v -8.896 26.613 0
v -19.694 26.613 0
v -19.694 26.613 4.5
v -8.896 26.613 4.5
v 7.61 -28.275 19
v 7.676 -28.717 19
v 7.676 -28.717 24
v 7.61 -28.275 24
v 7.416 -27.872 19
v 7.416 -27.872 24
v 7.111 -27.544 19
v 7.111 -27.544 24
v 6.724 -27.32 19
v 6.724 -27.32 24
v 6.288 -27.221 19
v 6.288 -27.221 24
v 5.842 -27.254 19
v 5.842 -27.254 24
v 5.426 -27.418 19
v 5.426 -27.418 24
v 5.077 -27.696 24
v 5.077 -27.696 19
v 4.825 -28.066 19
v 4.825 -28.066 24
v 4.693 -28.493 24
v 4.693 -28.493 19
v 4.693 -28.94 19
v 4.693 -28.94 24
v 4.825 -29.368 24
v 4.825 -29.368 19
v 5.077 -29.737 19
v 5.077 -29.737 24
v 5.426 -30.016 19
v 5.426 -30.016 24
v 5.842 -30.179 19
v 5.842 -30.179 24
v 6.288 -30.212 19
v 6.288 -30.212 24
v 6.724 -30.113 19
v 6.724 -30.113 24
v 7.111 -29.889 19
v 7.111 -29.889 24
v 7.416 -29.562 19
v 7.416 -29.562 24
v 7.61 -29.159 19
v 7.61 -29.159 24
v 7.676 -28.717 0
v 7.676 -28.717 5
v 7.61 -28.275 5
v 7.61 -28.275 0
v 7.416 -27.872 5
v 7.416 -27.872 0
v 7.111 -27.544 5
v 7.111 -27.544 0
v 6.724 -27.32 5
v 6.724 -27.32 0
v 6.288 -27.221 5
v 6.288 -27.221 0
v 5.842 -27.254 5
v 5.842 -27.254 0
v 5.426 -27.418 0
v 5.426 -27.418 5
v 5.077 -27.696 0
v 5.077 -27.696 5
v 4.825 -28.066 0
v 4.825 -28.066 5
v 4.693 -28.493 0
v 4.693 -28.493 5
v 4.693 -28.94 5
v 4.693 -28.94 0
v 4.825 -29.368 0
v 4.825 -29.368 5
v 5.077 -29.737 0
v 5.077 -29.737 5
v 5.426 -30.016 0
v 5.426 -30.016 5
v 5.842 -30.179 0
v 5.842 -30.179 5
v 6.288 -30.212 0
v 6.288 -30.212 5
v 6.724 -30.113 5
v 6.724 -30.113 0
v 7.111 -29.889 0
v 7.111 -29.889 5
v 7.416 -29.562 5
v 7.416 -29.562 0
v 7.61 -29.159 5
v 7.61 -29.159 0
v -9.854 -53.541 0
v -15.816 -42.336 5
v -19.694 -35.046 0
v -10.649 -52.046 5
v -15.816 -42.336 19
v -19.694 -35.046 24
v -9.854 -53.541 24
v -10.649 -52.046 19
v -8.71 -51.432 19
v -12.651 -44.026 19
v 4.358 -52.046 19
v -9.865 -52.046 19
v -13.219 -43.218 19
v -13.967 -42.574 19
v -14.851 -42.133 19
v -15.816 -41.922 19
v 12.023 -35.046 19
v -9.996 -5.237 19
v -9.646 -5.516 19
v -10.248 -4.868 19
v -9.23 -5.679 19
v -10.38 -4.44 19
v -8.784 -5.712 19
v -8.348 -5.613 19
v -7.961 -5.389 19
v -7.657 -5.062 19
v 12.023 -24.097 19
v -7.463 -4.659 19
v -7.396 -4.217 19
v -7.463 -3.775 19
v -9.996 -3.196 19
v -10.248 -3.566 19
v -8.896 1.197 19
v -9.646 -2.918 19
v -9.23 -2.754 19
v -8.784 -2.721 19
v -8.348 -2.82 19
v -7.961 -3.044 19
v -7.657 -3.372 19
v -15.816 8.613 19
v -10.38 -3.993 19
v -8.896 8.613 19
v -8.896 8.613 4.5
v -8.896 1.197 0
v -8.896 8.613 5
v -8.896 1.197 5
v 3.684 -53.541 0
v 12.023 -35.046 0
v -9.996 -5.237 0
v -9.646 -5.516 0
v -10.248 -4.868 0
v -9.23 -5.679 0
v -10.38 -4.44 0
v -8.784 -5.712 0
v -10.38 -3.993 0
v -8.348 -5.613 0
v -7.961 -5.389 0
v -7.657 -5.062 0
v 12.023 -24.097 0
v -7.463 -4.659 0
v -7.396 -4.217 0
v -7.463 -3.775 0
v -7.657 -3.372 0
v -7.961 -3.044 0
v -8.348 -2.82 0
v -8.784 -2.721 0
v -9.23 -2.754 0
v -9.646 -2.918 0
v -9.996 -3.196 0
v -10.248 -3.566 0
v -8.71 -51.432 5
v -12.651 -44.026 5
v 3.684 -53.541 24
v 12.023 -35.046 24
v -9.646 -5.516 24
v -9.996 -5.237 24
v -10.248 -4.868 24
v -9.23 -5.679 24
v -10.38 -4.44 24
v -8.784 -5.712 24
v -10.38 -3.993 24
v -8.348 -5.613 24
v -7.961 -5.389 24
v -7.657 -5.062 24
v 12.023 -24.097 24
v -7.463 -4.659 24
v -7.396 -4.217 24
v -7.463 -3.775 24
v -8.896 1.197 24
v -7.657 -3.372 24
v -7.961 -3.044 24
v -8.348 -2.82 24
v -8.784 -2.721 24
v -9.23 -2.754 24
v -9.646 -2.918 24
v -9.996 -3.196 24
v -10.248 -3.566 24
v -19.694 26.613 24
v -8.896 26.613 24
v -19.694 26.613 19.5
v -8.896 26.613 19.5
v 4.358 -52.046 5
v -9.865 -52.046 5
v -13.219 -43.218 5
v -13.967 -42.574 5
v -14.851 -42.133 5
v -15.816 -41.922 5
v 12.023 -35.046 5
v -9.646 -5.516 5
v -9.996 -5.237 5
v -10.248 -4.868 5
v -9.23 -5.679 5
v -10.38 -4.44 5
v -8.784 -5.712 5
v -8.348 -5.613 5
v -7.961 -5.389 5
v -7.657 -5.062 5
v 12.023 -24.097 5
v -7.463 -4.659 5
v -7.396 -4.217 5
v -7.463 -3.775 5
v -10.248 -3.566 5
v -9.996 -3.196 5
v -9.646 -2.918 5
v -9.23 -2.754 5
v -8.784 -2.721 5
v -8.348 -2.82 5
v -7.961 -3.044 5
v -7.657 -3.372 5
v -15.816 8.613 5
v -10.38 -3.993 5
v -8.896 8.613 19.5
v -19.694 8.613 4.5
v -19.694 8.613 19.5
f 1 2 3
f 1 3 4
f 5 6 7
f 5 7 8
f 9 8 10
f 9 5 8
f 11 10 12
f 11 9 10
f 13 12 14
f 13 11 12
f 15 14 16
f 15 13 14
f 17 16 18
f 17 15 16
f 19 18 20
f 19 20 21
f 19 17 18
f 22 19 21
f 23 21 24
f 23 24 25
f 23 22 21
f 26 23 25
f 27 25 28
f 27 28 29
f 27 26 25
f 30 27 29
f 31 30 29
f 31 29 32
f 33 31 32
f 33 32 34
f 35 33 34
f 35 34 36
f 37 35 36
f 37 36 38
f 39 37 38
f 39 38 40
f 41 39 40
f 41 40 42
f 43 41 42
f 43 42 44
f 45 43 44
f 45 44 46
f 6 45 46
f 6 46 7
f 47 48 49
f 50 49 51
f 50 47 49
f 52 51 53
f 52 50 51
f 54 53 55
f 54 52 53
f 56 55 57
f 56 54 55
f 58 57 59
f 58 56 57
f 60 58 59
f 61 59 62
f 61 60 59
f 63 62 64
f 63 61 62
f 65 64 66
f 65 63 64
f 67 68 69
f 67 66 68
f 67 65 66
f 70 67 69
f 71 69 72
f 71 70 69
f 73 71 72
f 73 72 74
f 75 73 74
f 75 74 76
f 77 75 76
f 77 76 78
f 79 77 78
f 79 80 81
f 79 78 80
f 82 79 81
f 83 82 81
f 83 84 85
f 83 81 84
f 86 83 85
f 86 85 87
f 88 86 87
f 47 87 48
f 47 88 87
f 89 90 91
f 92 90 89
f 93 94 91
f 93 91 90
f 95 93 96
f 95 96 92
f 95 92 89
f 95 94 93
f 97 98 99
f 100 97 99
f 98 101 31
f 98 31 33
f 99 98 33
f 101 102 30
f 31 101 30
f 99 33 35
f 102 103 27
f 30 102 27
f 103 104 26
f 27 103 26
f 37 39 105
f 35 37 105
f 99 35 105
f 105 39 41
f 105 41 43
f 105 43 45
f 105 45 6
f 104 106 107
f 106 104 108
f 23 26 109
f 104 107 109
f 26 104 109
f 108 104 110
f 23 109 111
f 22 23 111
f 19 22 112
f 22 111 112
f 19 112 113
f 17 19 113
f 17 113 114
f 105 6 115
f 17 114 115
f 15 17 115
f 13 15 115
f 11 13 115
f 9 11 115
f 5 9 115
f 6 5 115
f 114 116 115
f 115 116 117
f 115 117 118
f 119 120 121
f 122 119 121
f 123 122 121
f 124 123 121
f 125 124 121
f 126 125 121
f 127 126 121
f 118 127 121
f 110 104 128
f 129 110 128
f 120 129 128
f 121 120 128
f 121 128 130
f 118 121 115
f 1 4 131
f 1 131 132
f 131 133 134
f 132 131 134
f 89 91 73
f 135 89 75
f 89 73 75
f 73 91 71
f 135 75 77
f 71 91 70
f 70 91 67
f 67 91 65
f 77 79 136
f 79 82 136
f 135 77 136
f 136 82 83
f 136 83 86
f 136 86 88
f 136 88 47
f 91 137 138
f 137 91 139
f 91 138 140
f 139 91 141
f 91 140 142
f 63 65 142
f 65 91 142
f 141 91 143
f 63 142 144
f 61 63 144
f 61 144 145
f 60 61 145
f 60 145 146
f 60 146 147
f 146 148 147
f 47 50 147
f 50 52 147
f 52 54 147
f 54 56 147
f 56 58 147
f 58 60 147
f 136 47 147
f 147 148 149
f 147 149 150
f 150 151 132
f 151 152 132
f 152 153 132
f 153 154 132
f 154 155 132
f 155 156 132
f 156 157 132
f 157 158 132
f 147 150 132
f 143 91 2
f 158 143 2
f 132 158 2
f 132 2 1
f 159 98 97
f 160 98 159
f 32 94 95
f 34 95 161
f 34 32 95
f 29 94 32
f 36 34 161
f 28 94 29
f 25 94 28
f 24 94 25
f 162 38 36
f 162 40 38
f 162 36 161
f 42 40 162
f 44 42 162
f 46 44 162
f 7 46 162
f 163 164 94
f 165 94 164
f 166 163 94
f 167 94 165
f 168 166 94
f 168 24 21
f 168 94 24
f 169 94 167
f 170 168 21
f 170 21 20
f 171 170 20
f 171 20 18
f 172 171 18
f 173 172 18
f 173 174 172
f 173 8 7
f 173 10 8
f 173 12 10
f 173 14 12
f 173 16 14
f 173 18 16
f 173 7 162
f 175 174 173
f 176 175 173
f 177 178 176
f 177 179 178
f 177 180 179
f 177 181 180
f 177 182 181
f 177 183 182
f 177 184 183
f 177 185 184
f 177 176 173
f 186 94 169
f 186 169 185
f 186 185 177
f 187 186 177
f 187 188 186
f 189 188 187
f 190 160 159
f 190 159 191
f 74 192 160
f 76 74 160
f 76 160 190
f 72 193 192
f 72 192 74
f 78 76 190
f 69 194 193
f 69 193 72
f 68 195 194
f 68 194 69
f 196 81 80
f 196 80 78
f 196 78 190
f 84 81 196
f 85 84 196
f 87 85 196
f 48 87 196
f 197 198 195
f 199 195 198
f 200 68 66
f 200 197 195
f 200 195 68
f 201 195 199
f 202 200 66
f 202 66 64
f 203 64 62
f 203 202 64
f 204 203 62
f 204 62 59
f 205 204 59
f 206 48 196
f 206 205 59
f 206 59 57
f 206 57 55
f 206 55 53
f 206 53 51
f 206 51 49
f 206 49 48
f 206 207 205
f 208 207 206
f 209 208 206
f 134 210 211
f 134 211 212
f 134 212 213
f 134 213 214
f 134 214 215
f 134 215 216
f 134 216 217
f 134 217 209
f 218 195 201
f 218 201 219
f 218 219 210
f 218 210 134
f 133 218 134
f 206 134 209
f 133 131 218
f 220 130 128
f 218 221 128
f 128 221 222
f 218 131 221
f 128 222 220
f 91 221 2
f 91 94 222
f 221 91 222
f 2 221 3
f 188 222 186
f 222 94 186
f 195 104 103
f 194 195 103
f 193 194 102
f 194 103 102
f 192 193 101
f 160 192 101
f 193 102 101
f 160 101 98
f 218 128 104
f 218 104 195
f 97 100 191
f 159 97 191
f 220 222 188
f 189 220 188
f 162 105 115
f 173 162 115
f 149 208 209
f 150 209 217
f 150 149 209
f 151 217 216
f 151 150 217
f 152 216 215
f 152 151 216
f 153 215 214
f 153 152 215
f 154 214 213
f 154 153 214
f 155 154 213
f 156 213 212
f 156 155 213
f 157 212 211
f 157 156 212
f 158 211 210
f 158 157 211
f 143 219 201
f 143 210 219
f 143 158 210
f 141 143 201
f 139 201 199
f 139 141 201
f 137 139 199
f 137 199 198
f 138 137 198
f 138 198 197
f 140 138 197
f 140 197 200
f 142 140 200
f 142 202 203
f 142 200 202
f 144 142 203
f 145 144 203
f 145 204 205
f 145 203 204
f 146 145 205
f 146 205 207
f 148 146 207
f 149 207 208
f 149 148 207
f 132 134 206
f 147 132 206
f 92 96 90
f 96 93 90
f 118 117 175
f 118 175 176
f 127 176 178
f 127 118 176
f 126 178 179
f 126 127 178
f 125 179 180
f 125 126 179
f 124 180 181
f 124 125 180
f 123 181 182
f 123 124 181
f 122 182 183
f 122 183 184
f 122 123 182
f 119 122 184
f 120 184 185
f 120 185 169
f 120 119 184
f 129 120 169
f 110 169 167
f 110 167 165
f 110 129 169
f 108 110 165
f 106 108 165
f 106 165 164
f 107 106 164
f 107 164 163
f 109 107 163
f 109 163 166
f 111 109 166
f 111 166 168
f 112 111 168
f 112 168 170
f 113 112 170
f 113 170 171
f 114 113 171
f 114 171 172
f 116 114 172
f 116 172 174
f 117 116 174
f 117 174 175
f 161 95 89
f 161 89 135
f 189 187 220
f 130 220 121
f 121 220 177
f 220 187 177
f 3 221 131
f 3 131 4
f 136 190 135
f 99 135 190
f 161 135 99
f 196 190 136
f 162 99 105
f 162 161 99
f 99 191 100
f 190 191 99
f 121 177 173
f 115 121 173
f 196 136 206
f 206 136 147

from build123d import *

# Parameters (mm, degrees)
SKETCH_1_W          = 41.838517058
SKETCH_1_H          = 61.659283987
SKETCH_1_R          = 1.5
EXTRUDE_1_DEPTH     = 24
SHELL_START         = 5
SHELL_2_OUTLINE_R   = 6.5
SHELL_2_DEPTH       = 14
SKETCH_7_W          = 14
SKETCH_7_H          = 61.659283987
CUT_EXTRUDE_2_DEPTH = 38
SKETCH_11_W         = 14
SKETCH_11_H         = 61.659283987
EXTRUDE_2_DEPTH     = 14
SKETCH_12_W         = 10.1213772
SKETCH_12_H         = 61.659283987
CUT_EXTRUDE_3_DEPTH = 52.896145639
CUT_EXTRUDE_5_DEPTH = 47.819908548
SKETCH_18_W         = 15
SKETCH_18_H         = 18
CUT_EXTRUDE_6_DEPTH = 54.011520411
EXTRUDE_5_DEPTH     = 24
SKETCH_22_W         = 27.838517058
SKETCH_22_H         = 14
CUT_EXTRUDE_8_DEPTH = 17
SKETCH_23_W         = 14.991158549
SKETCH_23_H         = 11.73336261
EXTRUDE_8_DEPTH     = 2
FILLET_3_R          = 4


# Read off the part's stored shape, not the designer's step: 抽壳2
with BuildPart() as part:
    # 草图1 → 凸台-拉伸1 (new body)
    with BuildSketch(Plane.XY):
        with Locations((-8.896267572, -4.216675009)):
            Rectangle(SKETCH_1_W, SKETCH_1_H)
        with Locations((-8.896267572, -4.21667501)):
            Circle(SKETCH_1_R, mode=Mode.SUBTRACT)
        with Locations((6.176232993, -28.71667501)):
            Circle(SKETCH_1_R, mode=Mode.SUBTRACT)
    extrude(amount=EXTRUDE_1_DEPTH)

    # 抽壳2 outline → 抽壳2 (cut)
    # profile 1 of 2: a face of its own
    with BuildSketch(Plane.XY.offset(SHELL_START)):
        with BuildLine():
            Line((-24.815526101, 26.612966984), (-24.815526101, -35.046317003))
            Line((-24.815526101, -35.046317003), (4.697844602, -35.046317003))
            ThreePointArc((4.697844602, -35.046317003), (1.097738874, -24.659718332), (12.022990957, -25.876706469))
            Line((12.022990957, -25.876706469), (12.022990957, 26.612966984))
            Line((12.022990957, 26.612966984), (-24.815526101, 26.612966984))
        make_face()
        with Locations((-8.896267572, -4.21667501)):
            Circle(SHELL_2_OUTLINE_R, mode=Mode.SUBTRACT)
    # profile 2 of 2: a face of its own
    with BuildSketch(Plane.XY.offset(SHELL_START)):
        with BuildLine():
            ThreePointArc((12.022990957, -31.556643551), (10.23318967, -33.795169129), (7.654621384, -35.046317003))
            Line((7.654621384, -35.046317003), (12.022990957, -35.046317003))
            Line((12.022990957, -35.046317003), (12.022990957, -31.556643551))
        make_face()
    extrude(amount=SHELL_2_DEPTH, mode=Mode.SUBTRACT)

    # 草图7 → 切除-拉伸2 (cut)
    with BuildSketch(Plane(origin=(12.022990957, 0, 0), x_dir=(0, 0, -1), z_dir=(1, 0, 0))):
        with Locations((-12, -4.216675009)):
            Rectangle(SKETCH_7_W, SKETCH_7_H)
    extrude(amount=-CUT_EXTRUDE_2_DEPTH, mode=Mode.SUBTRACT)

    # 草图11 → 凸台-拉伸2 (add)
    with BuildSketch(Plane.ZY.offset(29.815526101)):
        with Locations((12, -4.216675009)):
            Rectangle(SKETCH_11_W, SKETCH_11_H)
    extrude(amount=-EXTRUDE_2_DEPTH)

    # 草图12 → 切除-拉伸3 (cut, through all)
    with BuildSketch(Plane.XY.offset(24)):
        with Locations((-24.754837501, -4.216675009)):
            Rectangle(SKETCH_12_W, SKETCH_12_H)
    extrude(amount=-CUT_EXTRUDE_3_DEPTH, mode=Mode.SUBTRACT)

    # 草图17 → 切除-拉伸5 (cut, through all)
    with BuildSketch(Plane.XY.offset(24)):
        Polygon((-8.896267572, 26.612966984), (-8.896267572, 1.197379191), (12.022990957, -24.097240197), (12.022990957, 26.612966984), align=None)
    extrude(amount=-CUT_EXTRUDE_5_DEPTH, mode=Mode.SUBTRACT)

    # 草图18 → 切除-拉伸6 (cut, through all)
    with BuildSketch(Plane.ZY.offset(19.694148901)):
        with Locations((12, 17.612966984)):
            Rectangle(SKETCH_18_W, SKETCH_18_H)
    extrude(amount=-CUT_EXTRUDE_6_DEPTH, mode=Mode.SUBTRACT)

    # 草图20 → 凸台-拉伸5 (add)
    with BuildSketch(Plane.XY.offset(24)):
        Polygon((-19.694148901, -35.046317003), (-9.853501275, -53.541034872), (3.683563025, -53.541034872), (12.022990957, -35.046317003), align=None)
    extrude(amount=-EXTRUDE_5_DEPTH)

    # 草图22 → 切除-拉伸8 (cut)
    with BuildSketch(Plane(origin=(0, -35.046317003, 0), x_dir=(1, 0, 0), z_dir=(0, 1, 0))):
        with Locations((-1.896267572, -12)):
            Rectangle(SKETCH_22_W, SKETCH_22_H)
    extrude(amount=-CUT_EXTRUDE_8_DEPTH, mode=Mode.SUBTRACT)

    # 草图23 → 凸台-拉伸8 (add)
    with BuildSketch(Plane(origin=(-29.881783728, -15.899464172, 0), x_dir=(0, 0, -1), z_dir=(0.8828123820911005, 0.469725768961675, 0))):
        with Locations((-11.904751729, -35.446570554)):
            Rectangle(SKETCH_23_W, SKETCH_23_H)
    extrude(amount=EXTRUDE_8_DEPTH)

    # 圆角3
    # the kernel refuses this fillet: 4 mm, written as the material it takes off along each edge
    with BuildSketch(Plane(origin=(-14.221722741, -41.073505124, 19), x_dir=(-0.8828123820904301, -0.4697257689629349, 0), z_dir=(0, 0, -1))) as fillet_3_piece_1:
        with BuildLine():
            CenterArc((4, -3.344189139), FILLET_3_R, 123.274953356, 56.725046644)
            Line((0, -3.344189139), (-0.08, -3.344189139))
            Line((-0.08, -3.344189139), (-0.08, 0))
            Line((-0.08, 0), (0, 0.08))
            ThreePointArc((0, 0.08), (0.902685209, 0.08), (1.761477827, 0.066883783))
            Line((1.761477827, 0.066883783), (1.805370419, 0))
        make_face()
    extrude(amount=14, mode=Mode.SUBTRACT)


solid = part.part
